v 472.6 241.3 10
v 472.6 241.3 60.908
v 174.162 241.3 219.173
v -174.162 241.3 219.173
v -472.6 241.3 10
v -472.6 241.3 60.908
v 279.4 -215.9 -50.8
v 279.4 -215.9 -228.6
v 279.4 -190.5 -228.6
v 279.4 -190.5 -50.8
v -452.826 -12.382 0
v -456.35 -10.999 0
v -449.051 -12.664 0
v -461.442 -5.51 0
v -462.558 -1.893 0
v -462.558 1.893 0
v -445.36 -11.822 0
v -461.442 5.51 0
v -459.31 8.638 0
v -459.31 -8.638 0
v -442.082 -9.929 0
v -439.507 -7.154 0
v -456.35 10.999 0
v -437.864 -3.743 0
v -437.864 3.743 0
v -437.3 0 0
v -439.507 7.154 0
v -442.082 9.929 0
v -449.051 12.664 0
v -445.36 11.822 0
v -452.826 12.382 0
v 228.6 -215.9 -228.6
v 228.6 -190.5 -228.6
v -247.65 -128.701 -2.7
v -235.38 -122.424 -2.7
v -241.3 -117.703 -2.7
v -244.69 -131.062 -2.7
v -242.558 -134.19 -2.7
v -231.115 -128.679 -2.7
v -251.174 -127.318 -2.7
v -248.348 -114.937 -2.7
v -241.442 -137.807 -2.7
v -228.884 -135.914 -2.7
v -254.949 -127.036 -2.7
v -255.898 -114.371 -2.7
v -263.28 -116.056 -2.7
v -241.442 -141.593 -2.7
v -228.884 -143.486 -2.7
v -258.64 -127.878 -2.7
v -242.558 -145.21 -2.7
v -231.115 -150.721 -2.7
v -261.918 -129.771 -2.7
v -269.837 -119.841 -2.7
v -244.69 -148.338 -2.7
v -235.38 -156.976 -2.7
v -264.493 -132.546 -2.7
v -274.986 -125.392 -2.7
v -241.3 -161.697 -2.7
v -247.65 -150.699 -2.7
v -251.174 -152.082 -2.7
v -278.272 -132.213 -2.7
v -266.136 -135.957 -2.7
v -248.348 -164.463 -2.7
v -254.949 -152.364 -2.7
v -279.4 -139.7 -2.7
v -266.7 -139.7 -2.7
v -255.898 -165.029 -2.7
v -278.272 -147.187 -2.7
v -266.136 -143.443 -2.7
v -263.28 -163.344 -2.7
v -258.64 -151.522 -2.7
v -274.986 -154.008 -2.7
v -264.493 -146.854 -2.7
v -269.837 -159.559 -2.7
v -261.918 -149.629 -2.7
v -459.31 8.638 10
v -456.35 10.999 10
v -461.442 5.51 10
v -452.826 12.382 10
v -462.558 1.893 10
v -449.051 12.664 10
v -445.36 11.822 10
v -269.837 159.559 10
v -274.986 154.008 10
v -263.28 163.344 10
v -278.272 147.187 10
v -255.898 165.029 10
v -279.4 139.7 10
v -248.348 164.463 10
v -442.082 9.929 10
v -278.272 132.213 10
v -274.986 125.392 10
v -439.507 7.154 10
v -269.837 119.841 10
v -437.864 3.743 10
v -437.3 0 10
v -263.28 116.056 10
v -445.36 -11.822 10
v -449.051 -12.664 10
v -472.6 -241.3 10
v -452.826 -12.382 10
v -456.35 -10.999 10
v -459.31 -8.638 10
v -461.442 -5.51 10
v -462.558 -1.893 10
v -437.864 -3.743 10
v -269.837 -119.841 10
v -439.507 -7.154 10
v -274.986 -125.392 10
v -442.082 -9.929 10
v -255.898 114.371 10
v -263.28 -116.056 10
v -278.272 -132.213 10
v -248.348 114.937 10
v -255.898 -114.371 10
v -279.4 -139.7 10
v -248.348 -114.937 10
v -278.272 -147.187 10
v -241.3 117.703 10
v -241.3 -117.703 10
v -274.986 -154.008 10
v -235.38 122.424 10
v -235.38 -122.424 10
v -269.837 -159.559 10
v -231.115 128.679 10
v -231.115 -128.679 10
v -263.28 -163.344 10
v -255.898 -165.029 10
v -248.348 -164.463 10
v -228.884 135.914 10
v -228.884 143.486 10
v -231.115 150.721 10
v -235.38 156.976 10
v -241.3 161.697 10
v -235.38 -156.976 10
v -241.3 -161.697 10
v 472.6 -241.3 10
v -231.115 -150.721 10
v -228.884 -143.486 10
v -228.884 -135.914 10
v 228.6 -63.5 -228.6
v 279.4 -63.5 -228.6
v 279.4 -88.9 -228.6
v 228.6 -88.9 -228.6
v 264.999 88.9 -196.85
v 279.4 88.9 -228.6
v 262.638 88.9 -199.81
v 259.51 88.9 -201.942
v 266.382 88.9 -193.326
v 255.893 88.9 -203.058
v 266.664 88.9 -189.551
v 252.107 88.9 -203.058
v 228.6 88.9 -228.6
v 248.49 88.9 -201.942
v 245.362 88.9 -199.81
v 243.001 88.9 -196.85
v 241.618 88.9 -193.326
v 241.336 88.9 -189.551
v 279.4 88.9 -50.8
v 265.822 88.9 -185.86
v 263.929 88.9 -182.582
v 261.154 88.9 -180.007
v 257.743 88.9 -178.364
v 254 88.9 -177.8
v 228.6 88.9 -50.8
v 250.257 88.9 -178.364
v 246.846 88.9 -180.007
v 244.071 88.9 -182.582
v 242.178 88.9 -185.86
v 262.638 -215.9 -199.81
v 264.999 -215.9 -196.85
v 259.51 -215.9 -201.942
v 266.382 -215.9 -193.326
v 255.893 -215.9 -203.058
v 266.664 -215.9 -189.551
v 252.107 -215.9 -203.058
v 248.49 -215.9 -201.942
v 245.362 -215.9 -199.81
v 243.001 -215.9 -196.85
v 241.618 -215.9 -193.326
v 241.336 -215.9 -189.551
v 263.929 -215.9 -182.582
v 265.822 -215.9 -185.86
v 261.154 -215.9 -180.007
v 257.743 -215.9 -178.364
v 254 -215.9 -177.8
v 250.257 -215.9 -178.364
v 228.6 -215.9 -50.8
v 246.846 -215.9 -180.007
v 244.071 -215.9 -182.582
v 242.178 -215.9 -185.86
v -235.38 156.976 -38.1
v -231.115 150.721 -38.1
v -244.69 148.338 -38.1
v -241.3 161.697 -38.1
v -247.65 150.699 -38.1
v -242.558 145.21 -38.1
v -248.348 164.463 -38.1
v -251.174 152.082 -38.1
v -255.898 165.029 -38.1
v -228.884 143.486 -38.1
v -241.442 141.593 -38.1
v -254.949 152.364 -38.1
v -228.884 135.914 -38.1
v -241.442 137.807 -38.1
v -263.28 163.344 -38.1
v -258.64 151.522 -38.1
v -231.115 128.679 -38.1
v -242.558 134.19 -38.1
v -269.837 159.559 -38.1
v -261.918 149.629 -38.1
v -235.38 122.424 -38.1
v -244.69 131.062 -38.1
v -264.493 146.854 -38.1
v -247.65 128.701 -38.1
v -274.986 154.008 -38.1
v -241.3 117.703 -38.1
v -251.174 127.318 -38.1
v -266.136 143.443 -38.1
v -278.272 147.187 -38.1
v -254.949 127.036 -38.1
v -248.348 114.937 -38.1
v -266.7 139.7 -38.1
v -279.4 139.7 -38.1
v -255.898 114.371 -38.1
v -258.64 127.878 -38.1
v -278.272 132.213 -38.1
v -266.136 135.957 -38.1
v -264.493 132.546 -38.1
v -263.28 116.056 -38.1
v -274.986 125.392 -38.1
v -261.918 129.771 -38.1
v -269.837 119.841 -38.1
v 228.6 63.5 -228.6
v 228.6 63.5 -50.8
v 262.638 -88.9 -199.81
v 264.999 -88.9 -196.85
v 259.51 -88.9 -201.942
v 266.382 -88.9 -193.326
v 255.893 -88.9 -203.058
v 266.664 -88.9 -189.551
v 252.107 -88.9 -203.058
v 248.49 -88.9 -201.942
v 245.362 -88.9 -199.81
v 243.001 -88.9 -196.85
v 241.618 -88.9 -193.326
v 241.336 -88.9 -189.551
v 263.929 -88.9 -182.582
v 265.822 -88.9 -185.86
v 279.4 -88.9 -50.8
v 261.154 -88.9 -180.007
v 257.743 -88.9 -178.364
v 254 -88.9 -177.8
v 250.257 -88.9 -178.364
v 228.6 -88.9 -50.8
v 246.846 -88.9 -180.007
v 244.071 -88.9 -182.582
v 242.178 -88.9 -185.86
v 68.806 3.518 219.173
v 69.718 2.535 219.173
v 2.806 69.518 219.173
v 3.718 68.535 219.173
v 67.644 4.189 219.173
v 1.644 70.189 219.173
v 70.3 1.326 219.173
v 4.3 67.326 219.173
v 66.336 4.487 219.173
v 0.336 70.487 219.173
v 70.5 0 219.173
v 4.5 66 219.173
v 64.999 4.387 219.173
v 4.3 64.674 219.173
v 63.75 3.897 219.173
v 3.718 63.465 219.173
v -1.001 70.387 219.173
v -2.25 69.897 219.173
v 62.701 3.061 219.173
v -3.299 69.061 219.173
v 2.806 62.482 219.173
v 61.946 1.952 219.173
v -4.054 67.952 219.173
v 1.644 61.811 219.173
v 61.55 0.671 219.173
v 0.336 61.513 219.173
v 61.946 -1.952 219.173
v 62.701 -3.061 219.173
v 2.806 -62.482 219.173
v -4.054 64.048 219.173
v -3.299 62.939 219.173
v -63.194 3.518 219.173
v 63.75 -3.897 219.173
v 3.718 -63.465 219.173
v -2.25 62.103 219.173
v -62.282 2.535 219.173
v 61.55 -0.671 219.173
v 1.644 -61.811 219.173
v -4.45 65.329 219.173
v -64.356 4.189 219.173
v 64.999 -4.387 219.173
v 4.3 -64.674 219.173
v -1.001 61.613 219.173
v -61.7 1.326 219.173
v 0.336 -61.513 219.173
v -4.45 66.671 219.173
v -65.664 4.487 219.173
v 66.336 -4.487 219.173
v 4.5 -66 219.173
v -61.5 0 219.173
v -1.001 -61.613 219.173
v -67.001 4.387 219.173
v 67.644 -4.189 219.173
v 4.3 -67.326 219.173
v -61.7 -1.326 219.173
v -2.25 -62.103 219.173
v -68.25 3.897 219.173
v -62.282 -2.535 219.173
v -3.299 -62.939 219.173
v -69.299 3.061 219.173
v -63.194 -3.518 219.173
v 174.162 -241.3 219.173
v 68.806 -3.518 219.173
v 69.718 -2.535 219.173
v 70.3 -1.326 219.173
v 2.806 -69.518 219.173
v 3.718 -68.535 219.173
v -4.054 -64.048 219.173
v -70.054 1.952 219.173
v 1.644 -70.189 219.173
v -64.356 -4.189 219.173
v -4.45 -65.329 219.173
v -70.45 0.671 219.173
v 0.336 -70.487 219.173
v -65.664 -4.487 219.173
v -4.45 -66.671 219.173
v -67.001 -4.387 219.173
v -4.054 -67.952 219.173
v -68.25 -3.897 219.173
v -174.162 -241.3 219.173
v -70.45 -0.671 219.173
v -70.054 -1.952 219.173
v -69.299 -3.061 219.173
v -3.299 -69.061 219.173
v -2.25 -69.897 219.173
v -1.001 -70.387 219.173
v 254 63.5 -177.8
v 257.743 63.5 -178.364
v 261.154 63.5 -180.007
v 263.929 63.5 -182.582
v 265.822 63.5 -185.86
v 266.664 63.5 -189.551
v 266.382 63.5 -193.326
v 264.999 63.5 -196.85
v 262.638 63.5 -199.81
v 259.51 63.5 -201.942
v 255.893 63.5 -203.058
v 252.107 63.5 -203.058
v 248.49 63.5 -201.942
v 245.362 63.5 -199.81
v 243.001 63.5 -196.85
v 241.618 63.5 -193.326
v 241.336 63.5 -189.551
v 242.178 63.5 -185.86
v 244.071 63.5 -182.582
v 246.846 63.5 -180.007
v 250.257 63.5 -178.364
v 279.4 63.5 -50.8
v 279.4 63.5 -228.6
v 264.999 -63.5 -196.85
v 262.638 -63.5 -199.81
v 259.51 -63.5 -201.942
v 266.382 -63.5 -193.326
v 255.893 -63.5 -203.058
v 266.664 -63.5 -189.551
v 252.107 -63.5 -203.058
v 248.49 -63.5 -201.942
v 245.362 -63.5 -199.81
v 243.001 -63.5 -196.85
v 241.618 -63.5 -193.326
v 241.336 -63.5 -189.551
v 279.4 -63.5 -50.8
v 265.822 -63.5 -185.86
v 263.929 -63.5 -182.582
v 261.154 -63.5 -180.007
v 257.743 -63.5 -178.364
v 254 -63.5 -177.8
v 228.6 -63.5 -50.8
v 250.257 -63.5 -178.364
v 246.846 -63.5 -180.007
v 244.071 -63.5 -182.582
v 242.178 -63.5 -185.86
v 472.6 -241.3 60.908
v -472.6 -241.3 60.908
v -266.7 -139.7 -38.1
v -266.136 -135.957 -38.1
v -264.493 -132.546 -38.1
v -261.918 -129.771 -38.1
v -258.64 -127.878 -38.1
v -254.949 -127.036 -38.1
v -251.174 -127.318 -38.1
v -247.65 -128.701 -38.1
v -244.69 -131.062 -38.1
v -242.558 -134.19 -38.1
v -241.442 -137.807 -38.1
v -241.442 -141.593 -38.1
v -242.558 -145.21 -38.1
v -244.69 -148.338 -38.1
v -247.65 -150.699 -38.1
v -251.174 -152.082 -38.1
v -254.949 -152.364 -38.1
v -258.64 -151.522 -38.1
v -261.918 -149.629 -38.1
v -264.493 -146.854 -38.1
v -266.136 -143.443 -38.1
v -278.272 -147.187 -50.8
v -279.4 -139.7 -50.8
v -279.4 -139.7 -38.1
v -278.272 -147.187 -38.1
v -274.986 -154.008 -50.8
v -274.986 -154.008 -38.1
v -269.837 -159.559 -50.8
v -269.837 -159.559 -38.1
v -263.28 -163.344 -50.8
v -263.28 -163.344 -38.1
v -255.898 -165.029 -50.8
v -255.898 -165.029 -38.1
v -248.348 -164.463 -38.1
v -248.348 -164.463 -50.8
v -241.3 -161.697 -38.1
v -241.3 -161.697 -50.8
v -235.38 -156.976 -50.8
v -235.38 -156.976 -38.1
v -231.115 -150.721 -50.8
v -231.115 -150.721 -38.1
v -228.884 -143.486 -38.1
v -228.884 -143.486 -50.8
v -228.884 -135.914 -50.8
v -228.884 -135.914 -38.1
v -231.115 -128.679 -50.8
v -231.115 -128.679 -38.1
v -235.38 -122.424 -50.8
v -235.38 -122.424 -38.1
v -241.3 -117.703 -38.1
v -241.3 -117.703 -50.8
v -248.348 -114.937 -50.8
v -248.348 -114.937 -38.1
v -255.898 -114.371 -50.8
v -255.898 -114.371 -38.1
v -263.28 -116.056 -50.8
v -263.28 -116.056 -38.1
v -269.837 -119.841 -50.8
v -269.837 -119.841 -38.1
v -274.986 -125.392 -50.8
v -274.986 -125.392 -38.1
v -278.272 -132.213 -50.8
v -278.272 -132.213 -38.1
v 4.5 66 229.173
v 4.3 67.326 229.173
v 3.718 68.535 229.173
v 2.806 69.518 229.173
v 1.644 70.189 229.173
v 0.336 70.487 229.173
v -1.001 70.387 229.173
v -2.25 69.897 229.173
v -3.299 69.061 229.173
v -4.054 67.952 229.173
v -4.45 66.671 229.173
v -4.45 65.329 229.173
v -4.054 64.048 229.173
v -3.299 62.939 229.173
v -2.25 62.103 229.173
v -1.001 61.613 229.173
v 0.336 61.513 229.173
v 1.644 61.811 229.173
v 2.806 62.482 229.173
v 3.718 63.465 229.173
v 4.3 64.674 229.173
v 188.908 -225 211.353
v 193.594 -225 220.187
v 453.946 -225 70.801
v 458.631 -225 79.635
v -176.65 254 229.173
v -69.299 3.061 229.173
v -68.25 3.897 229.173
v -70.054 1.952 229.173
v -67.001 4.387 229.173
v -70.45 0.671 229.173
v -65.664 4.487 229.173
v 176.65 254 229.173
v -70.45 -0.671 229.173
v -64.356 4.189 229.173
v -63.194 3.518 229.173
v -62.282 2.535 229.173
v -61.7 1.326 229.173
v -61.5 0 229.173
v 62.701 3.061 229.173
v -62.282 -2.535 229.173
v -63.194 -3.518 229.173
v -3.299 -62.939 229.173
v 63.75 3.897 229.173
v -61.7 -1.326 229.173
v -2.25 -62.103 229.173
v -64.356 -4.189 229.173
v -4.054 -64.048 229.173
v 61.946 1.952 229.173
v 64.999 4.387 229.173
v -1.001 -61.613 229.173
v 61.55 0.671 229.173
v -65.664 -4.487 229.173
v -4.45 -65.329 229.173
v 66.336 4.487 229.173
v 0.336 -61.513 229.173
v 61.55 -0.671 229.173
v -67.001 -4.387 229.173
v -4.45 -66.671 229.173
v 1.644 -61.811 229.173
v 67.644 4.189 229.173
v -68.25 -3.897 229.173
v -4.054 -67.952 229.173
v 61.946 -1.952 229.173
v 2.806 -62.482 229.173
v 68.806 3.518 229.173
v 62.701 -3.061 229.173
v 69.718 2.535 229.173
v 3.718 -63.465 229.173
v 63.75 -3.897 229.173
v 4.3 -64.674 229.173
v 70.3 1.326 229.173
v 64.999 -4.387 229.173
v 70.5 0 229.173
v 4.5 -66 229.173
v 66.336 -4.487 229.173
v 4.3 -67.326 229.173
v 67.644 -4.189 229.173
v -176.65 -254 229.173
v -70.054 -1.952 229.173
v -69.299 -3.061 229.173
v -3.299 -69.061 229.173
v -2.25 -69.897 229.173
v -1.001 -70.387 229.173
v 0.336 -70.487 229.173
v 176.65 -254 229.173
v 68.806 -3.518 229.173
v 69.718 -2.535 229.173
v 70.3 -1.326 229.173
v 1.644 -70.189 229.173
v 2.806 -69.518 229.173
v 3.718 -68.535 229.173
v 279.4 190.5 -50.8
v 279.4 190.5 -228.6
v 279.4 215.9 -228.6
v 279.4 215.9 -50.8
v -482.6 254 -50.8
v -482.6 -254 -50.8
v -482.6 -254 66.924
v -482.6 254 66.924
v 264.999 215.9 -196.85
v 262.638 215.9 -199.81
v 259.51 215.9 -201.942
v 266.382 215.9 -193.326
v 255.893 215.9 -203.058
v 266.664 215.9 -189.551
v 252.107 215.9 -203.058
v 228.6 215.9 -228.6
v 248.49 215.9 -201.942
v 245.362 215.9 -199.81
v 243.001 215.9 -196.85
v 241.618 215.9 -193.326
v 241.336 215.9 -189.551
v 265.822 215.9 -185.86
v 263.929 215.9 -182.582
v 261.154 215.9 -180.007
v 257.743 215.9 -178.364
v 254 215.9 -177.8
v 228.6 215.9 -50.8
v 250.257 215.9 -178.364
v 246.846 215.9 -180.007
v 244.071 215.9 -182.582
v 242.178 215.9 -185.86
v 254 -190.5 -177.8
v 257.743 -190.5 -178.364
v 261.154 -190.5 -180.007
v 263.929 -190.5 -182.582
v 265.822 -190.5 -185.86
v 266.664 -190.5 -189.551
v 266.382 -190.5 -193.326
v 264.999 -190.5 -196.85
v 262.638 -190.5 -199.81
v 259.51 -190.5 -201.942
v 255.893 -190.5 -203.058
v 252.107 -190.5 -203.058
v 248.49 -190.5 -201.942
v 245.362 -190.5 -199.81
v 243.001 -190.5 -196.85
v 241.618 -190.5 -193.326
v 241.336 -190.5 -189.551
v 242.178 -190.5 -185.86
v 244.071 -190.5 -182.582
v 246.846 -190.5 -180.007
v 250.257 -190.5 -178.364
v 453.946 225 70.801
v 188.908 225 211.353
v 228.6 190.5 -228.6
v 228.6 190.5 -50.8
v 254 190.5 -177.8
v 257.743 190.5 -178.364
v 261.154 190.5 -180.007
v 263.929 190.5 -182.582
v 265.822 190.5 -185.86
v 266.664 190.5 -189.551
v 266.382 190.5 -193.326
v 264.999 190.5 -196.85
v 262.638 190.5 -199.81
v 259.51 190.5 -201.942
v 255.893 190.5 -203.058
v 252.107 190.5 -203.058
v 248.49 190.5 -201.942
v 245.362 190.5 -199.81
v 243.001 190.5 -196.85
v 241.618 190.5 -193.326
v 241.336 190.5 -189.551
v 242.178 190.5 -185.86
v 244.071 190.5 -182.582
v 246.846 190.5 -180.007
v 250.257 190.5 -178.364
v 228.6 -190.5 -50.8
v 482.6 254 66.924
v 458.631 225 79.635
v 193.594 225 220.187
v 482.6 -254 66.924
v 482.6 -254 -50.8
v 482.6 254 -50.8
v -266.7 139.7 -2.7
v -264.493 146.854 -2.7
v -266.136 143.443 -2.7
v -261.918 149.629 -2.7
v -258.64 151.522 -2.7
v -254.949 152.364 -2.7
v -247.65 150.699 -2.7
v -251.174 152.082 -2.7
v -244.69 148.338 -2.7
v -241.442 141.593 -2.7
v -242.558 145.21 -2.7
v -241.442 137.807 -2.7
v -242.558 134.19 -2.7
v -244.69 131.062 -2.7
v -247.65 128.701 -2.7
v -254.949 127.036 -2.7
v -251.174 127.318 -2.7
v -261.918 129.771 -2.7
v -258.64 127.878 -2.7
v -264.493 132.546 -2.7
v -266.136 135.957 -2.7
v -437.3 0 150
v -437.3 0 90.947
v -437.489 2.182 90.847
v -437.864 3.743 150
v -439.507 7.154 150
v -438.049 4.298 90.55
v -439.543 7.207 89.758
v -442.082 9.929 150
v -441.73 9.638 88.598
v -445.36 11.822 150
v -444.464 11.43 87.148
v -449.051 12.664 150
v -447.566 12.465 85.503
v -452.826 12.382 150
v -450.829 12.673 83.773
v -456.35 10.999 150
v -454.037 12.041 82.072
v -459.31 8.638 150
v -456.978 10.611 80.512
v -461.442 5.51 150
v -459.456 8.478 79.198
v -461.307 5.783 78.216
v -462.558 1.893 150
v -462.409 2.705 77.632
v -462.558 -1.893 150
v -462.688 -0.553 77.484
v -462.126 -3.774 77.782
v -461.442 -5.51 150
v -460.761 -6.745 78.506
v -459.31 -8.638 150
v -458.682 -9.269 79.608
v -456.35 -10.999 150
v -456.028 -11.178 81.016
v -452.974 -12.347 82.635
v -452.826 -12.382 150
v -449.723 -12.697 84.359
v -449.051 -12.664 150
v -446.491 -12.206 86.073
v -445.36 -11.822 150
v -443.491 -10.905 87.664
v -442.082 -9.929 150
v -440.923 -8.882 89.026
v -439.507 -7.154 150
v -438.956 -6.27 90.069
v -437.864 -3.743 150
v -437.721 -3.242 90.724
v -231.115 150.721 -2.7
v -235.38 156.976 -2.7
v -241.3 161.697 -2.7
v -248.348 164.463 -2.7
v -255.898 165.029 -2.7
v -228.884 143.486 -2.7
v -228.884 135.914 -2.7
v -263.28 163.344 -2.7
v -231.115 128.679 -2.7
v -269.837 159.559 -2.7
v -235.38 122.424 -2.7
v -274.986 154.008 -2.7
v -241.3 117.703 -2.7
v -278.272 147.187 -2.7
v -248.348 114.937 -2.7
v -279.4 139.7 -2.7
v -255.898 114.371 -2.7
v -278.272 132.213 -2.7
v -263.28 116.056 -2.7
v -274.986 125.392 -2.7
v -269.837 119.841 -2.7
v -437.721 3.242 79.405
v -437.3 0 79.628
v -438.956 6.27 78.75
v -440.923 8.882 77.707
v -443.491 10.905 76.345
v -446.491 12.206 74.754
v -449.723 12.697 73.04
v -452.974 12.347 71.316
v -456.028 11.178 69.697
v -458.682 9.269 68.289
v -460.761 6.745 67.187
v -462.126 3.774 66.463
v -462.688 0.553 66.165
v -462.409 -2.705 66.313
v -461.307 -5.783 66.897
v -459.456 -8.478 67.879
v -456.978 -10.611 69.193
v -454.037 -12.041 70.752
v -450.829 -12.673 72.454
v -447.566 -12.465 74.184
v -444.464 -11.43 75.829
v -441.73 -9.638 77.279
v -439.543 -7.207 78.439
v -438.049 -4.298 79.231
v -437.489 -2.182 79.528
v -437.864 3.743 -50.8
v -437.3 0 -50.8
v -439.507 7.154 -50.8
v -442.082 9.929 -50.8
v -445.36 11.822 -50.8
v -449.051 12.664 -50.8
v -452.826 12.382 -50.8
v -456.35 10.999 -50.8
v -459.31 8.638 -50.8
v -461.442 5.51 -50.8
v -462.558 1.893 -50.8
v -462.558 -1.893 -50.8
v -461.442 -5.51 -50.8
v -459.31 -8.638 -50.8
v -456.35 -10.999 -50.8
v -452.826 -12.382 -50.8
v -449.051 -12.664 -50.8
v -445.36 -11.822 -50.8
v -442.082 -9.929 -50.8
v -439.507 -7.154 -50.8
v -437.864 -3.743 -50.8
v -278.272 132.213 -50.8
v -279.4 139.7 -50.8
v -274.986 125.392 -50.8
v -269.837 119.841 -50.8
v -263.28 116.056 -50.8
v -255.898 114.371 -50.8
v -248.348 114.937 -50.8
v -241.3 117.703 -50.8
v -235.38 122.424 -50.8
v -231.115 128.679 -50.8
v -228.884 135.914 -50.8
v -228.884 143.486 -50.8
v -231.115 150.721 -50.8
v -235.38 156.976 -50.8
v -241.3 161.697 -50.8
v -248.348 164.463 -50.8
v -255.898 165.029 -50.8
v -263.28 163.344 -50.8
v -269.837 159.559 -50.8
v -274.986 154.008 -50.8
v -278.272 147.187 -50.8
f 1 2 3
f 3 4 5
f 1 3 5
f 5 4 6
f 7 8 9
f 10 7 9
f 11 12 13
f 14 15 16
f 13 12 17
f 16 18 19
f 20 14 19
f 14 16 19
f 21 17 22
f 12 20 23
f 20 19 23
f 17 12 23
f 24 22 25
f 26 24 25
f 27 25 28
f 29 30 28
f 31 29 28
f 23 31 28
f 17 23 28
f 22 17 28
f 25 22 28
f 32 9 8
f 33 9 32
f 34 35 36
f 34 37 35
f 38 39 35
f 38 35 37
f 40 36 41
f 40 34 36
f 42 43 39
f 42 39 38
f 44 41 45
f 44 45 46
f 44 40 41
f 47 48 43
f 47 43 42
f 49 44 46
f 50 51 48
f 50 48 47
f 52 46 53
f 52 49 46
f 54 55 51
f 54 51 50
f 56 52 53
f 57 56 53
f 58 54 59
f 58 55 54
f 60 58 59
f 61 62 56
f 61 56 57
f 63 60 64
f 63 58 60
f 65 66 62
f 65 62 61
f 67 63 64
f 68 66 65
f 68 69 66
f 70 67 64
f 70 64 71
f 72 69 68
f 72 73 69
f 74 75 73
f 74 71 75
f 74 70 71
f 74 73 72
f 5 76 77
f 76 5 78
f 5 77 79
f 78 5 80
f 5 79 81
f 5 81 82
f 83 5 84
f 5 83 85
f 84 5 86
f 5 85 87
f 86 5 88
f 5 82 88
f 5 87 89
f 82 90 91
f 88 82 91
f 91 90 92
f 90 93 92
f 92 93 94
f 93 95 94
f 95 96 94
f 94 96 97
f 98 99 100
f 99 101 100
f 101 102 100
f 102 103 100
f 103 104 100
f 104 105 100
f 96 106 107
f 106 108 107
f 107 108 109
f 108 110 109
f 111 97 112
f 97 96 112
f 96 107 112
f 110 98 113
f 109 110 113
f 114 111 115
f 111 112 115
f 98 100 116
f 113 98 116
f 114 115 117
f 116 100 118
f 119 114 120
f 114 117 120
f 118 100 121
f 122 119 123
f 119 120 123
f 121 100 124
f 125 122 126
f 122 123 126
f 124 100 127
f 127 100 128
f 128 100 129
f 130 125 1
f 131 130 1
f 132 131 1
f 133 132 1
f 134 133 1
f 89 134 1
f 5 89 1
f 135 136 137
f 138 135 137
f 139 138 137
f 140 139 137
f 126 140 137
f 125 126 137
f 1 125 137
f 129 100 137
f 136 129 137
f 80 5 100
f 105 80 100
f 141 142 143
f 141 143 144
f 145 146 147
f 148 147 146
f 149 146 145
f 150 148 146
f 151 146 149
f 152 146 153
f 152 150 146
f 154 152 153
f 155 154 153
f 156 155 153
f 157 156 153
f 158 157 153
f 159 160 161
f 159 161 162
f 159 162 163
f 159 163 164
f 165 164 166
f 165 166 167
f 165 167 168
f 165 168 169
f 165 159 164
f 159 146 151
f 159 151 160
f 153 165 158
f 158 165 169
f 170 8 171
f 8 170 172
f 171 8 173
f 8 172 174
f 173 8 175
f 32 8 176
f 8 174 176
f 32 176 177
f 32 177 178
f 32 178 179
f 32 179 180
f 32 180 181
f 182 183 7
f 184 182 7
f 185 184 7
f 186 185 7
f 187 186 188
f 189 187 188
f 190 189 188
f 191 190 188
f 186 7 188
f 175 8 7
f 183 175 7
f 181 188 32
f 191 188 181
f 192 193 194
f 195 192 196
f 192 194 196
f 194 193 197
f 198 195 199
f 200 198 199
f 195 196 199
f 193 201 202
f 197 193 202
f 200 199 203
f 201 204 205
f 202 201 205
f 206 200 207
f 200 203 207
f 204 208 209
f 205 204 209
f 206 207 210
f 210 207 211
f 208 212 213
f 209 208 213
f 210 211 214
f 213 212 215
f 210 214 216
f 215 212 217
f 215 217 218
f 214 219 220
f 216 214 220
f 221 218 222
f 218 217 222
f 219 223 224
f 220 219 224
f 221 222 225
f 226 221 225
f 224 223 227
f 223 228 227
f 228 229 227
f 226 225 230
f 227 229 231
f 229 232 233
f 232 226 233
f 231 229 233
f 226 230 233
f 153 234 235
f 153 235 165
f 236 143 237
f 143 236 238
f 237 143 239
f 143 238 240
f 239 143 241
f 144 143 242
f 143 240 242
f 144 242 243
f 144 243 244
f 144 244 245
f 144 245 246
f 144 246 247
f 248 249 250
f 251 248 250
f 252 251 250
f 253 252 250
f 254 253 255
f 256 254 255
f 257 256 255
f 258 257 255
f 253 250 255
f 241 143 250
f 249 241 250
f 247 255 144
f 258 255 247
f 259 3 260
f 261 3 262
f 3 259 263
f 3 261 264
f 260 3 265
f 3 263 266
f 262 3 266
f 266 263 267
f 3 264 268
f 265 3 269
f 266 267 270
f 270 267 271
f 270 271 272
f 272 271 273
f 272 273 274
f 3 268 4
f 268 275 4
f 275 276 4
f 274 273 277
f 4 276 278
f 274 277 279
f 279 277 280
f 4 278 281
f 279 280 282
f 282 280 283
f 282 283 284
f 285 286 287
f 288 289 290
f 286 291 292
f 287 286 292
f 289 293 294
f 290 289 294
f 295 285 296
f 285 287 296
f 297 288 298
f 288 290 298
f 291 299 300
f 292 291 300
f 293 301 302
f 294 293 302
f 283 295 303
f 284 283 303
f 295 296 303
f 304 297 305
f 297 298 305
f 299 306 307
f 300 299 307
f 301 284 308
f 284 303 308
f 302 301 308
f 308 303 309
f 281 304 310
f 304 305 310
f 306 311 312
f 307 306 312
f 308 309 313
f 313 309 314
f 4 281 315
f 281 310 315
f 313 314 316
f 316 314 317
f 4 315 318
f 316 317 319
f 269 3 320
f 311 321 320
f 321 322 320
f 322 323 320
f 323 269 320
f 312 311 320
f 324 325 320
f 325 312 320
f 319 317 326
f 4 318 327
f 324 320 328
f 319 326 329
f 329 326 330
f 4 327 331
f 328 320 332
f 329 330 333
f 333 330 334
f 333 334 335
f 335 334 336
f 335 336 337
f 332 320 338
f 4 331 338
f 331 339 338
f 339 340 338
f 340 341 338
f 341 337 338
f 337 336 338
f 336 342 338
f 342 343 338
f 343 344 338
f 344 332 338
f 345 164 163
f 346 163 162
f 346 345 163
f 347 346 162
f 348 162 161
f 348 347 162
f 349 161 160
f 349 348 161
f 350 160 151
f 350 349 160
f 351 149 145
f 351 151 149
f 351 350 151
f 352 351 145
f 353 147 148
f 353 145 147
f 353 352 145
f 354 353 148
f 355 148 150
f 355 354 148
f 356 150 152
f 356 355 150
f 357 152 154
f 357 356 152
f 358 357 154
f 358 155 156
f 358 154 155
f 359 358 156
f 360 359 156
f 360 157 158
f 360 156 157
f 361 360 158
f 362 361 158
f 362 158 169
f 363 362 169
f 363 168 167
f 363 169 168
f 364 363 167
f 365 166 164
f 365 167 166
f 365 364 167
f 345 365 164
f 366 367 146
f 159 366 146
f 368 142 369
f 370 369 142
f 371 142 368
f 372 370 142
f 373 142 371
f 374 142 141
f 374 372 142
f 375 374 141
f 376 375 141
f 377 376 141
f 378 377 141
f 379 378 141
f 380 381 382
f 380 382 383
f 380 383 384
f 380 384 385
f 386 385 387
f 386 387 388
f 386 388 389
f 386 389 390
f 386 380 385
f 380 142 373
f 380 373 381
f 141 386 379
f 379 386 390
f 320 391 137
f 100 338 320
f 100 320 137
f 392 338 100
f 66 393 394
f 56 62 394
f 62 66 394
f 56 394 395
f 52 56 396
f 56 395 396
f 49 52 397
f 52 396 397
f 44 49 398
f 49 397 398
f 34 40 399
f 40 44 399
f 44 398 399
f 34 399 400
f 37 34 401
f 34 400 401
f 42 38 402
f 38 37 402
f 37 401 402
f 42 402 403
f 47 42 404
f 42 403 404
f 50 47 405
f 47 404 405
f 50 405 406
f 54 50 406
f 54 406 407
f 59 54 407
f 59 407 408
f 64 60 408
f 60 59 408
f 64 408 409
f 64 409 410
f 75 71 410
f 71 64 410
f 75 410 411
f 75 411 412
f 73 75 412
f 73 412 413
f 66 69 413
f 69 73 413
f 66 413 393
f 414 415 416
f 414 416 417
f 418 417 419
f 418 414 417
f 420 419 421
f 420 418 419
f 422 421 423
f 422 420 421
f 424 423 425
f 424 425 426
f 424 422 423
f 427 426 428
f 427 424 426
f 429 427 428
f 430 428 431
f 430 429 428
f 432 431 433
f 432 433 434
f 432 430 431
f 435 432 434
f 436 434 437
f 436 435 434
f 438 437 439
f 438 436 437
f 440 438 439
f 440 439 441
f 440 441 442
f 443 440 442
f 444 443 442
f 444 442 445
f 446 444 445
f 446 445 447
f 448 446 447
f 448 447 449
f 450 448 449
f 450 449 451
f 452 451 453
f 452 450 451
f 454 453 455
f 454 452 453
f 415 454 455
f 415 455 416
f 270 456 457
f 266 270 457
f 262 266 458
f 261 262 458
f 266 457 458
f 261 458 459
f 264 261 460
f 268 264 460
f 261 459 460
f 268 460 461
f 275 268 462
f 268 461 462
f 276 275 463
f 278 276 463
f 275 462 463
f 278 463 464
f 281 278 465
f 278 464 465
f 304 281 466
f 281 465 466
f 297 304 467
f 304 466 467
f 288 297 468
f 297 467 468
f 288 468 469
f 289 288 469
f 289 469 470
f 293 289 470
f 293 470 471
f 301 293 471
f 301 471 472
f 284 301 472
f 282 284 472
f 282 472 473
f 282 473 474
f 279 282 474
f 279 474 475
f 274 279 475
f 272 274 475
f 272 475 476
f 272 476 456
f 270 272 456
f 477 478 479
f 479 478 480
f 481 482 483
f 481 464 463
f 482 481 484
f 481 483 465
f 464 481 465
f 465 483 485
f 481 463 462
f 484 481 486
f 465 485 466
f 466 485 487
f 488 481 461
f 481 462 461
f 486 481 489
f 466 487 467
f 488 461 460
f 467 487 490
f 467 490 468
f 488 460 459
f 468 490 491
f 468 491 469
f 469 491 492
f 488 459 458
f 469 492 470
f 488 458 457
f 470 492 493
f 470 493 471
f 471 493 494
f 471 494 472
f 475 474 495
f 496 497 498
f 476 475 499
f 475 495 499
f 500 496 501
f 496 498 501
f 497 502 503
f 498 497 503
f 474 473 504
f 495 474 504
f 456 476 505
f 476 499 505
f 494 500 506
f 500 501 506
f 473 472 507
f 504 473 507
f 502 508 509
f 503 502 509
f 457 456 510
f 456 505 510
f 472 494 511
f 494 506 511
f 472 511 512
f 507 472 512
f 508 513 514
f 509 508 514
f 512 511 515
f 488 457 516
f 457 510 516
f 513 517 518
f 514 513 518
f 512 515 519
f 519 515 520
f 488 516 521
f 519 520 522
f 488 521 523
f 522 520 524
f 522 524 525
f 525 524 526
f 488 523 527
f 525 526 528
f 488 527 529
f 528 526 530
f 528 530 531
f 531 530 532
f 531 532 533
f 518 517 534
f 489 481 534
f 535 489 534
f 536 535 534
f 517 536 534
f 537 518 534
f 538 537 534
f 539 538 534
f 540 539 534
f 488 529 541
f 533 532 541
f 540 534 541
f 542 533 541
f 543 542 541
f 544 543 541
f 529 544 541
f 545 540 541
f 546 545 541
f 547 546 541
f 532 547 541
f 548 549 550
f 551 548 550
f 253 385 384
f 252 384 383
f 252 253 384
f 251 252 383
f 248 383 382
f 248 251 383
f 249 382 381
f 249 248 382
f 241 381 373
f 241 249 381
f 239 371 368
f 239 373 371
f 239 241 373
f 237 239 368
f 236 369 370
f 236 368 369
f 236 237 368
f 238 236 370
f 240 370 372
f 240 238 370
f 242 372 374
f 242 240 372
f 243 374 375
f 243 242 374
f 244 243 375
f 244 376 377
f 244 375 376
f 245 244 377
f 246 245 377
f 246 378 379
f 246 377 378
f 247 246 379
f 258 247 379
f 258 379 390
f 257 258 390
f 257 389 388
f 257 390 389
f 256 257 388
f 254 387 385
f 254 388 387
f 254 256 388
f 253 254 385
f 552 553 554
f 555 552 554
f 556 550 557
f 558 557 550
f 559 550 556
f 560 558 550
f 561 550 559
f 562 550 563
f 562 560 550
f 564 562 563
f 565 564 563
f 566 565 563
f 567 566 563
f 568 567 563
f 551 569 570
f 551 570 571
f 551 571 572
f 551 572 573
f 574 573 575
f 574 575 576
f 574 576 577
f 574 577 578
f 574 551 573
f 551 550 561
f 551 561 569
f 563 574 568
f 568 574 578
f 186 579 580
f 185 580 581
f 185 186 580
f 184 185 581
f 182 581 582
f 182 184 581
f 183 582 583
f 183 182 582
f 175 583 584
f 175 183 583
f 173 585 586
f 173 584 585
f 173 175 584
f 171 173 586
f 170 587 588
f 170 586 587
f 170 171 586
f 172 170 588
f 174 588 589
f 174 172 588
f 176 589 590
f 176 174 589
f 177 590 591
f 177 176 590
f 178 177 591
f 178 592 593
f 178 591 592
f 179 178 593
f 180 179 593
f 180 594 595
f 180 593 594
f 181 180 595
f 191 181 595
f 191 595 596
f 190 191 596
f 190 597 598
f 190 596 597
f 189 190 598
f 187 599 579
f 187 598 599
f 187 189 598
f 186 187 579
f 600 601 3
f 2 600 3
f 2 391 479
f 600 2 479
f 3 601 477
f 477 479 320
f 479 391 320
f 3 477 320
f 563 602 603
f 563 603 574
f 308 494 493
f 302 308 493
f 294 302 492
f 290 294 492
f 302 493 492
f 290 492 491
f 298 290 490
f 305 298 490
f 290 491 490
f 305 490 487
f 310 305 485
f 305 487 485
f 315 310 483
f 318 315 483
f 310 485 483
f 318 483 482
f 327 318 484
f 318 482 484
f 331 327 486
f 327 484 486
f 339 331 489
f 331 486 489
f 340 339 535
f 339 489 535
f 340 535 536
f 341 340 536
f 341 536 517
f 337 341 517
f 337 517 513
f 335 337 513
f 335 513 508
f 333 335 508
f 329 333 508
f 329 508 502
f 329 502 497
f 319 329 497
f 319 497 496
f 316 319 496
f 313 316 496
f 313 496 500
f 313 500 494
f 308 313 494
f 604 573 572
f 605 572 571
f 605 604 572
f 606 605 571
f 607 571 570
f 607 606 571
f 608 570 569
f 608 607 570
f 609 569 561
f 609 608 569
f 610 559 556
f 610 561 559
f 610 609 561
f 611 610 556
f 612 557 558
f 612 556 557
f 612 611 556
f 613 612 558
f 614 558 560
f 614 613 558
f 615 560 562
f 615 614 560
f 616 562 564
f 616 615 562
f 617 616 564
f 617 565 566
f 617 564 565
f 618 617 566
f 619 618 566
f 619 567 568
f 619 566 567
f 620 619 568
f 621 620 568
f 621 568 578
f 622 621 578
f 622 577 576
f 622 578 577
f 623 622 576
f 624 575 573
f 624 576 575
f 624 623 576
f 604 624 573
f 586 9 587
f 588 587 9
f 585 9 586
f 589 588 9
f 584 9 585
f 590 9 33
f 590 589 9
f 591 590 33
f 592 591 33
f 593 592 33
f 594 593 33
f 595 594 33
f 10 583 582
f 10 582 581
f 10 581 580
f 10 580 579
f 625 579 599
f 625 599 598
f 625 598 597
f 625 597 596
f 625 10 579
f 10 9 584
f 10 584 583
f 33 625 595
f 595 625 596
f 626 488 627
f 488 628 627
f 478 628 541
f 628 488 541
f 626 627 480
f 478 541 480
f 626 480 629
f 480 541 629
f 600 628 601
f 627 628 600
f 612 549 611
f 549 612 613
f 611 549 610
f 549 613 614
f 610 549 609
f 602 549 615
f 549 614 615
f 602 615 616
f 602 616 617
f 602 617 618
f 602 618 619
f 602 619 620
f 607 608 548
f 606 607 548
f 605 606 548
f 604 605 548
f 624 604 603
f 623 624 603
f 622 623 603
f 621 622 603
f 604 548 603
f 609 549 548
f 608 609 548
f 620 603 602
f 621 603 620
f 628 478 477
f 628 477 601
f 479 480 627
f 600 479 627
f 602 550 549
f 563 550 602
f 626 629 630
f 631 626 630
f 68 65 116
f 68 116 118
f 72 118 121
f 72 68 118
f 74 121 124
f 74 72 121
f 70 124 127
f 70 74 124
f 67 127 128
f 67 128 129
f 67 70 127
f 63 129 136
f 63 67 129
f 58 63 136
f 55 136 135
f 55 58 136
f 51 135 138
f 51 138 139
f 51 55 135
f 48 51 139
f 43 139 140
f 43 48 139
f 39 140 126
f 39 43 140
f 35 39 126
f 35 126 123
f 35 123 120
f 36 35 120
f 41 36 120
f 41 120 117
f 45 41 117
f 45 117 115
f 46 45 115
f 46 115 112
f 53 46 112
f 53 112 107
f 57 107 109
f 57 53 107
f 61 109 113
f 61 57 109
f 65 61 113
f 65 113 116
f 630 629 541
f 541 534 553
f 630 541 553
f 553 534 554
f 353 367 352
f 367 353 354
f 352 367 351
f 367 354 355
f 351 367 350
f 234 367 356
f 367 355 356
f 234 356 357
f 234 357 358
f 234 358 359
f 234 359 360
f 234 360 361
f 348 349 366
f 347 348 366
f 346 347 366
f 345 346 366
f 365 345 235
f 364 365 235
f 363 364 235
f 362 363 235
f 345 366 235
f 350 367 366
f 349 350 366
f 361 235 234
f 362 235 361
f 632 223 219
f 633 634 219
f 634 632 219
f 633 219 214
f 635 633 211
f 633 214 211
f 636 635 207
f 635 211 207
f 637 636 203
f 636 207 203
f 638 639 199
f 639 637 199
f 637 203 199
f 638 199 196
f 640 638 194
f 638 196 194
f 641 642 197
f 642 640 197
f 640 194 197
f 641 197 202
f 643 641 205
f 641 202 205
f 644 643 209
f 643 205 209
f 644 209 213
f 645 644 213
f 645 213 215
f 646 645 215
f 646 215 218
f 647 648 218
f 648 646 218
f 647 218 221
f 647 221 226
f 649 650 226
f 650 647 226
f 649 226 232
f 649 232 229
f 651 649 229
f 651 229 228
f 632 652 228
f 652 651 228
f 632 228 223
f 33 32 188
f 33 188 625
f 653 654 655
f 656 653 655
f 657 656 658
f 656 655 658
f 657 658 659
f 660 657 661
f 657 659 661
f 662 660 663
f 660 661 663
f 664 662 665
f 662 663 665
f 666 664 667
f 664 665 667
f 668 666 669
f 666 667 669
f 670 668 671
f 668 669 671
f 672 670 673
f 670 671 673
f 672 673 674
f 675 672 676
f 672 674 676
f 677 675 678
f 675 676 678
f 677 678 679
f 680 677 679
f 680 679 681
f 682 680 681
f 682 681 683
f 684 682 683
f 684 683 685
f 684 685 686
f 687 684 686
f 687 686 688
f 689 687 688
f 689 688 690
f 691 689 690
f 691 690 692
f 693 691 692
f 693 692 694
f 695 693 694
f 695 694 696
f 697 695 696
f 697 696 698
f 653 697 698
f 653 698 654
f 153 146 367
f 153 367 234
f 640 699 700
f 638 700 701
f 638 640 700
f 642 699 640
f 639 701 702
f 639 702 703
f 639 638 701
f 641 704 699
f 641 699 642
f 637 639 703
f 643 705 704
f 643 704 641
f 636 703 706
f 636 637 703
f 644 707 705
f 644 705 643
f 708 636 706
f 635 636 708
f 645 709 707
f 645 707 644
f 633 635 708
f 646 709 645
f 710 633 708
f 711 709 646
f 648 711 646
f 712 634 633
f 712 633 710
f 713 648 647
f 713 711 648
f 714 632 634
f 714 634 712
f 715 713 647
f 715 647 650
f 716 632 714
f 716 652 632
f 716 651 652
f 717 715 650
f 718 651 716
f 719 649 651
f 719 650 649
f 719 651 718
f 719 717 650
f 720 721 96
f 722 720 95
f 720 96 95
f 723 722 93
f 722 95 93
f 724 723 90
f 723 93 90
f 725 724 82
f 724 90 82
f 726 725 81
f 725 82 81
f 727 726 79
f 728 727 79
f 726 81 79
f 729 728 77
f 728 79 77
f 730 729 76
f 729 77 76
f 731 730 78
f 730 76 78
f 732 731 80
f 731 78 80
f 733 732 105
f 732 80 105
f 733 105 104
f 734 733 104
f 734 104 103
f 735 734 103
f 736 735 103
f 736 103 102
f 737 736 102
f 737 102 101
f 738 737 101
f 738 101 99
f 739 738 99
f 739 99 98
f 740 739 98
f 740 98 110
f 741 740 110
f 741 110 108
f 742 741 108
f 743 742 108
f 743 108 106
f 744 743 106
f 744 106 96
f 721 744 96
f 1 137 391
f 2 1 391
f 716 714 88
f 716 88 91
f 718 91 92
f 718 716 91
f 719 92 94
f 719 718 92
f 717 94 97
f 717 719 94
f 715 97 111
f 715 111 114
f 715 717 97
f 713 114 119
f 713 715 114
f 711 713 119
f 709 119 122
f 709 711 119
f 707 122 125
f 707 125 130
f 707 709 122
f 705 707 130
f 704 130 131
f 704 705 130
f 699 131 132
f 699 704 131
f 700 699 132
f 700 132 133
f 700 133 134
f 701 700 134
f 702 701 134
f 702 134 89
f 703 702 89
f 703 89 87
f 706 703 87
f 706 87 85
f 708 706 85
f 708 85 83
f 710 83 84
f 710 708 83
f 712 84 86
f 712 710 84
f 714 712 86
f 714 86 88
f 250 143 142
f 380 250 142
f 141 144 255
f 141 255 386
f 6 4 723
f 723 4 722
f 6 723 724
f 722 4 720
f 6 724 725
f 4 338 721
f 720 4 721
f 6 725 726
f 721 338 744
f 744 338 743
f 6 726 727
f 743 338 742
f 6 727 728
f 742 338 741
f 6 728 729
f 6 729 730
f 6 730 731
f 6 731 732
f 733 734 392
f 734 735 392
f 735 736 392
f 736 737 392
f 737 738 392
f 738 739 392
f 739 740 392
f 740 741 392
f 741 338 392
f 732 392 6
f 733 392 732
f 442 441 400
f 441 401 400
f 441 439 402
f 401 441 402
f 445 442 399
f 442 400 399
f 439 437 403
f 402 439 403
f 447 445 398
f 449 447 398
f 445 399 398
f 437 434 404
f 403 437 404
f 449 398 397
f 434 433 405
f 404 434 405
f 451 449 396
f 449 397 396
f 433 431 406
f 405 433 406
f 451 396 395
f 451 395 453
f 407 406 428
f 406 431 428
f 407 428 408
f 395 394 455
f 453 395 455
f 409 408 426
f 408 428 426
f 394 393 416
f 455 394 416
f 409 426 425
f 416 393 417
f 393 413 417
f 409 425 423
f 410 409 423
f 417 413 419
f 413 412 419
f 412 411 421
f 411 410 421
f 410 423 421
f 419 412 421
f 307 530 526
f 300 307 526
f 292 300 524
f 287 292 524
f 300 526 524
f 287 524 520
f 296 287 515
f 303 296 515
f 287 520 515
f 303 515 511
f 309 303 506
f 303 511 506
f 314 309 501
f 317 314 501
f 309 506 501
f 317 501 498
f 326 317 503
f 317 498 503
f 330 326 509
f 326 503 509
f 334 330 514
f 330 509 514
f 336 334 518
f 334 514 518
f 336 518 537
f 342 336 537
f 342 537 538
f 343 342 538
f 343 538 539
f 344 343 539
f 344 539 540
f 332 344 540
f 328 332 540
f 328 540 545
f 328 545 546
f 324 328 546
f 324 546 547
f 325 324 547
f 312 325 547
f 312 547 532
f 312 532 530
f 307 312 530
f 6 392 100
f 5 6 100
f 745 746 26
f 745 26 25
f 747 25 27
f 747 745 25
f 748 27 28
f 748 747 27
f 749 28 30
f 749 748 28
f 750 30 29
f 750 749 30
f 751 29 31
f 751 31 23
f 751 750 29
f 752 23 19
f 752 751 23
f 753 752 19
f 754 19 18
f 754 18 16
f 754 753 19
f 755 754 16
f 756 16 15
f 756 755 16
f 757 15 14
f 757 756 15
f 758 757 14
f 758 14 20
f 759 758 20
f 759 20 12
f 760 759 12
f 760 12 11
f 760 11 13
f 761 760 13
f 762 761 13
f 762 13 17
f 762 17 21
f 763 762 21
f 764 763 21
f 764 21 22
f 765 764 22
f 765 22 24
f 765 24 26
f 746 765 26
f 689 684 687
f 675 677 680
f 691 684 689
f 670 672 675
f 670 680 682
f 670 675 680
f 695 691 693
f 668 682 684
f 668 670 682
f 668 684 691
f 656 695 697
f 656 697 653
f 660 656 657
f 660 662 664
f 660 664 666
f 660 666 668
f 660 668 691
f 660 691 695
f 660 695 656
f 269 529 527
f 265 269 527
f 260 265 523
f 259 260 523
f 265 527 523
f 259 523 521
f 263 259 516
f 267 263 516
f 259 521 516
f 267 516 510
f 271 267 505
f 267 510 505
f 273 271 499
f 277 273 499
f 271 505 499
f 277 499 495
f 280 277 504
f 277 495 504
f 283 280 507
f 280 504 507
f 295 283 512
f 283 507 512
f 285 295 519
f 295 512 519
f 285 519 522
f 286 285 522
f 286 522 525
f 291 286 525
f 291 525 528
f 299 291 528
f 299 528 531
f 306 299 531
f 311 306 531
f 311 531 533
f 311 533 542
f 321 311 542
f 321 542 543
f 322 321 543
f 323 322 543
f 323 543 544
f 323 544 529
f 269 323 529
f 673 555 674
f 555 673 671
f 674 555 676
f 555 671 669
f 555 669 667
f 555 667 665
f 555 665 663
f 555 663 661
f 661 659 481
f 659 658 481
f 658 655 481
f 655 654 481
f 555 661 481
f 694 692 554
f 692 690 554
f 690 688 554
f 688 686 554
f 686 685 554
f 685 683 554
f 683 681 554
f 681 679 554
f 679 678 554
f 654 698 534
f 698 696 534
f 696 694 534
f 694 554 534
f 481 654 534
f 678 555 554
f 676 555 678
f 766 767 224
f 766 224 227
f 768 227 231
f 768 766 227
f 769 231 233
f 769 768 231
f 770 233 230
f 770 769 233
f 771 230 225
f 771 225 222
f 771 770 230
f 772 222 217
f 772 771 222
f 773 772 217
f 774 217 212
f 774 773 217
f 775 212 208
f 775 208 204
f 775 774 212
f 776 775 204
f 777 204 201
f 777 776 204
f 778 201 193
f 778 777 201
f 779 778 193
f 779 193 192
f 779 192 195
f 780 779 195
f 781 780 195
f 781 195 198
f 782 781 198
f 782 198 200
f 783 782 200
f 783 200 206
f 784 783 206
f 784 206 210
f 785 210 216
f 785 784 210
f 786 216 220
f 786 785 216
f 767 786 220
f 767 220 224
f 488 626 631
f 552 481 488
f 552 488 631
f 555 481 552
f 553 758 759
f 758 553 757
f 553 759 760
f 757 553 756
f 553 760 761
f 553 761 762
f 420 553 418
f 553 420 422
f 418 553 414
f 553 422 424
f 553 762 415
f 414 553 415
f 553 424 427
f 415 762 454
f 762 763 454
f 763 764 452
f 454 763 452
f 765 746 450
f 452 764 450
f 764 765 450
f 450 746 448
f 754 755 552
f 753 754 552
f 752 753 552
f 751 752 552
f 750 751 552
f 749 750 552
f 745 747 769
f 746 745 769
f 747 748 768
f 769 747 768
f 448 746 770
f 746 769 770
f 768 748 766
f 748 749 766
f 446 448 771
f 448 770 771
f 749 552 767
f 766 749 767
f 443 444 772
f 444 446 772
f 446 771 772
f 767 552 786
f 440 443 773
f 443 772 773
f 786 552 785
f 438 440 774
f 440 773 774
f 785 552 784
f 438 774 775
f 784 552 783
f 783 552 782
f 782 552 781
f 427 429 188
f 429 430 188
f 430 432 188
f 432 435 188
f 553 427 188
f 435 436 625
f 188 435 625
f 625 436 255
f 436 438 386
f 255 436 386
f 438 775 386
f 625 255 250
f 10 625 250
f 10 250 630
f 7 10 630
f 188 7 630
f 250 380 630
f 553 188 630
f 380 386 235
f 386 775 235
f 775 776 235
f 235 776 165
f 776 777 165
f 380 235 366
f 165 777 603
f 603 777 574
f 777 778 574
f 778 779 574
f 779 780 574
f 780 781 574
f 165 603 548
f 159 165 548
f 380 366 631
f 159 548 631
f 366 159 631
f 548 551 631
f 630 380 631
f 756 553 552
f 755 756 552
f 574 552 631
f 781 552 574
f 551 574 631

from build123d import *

# Parameters (mm, degrees)
SKETCH1_W                = 965.2
SKETCH1_H                = 508
BOSS_EXTRUDE1_DEPTH      = 50.8
SKETCH3_W                = 50.8
SKETCH3_H                = 25.4
BOSS_EXTRUDE2_DEPTH      = 177.8
CUT_EXTRUDE2_DEPTH       = 592.334693723
CUT_EXTRUDE2_DEPTH_BACK  = 592.334693723
SKETCH4_R                = 12.7
BOSS_EXTRUDE3_DEPTH      = 254
BOSS_EXTRUDE3_DEPTH_BACK = 254
BOSS_EXTRUDE4_DEPTH      = 12.7
BOSS_EXTRUDE5_START      = -508
BOSS_EXTRUDE5_DEPTH      = 12.7
CUT_EXTRUDE3_DEPTH       = 592.556393084
CUT_EXTRUDE3_DEPTH_BACK  = 592.556393084
SKETCH2_R                = 12.7
CUT_EXTRUDE4_START       = -50.8
SKETCH12_R               = 25.4
SKETCH12_R_2             = 12.7
CUT_EXTRUDE4_DEPTH       = 12.7
SKETCH13_R               = 12.7
CUT_EXTRUDE5_DEPTH       = 25.4
CUT_EXTRUDE6_START       = -2.7
SKETCH14_R               = 25.4
SKETCH14_R_2             = 12.7
CUT_EXTRUDE6_DEPTH       = 12.7
CUT_EXTRUDE7_DEPTH       = 10
CUT_EXTRUDE7_DEPTH_BACK  = 592.556393084
SKETCH15_R               = 12.7
SKETCH2_4_R              = 12.7
BOSS_EXTRUDE6_DEPTH      = 150
CUT_EXTRUDE8_REACH       = 714.022
SKETCH16_R               = 4.5
CUT_EXTRUDE9_REACH       = 823.718
SKETCH17_W               = 300
SKETCH17_H               = 450


with BuildPart() as part:
    # Sketch1 → Boss-Extrude1 (new body)
    with BuildSketch(Plane.XY):
        Rectangle(SKETCH1_W, SKETCH1_H)
    extrude(amount=-BOSS_EXTRUDE1_DEPTH)

    # Sketch3 → Boss-Extrude2 (add)
    with BuildSketch(Plane(origin=(0, 0, -50.8), x_dir=(-1, 0, 0), z_dir=(0, 0, -1))):
        with Locations((-254, 203.2)):
            Rectangle(SKETCH3_W, SKETCH3_H)
        with Locations((-254, 76.2)):
            Rectangle(SKETCH3_W, SKETCH3_H)
        with Locations((-254, -76.2)):
            Rectangle(SKETCH3_W, SKETCH3_H)
        with Locations((-254, -203.2)):
            Rectangle(SKETCH3_W, SKETCH3_H)
    extrude(amount=BOSS_EXTRUDE2_DEPTH)

    # Sketch4 → Cut-Extrude2 (cut, two sides: drawn at the far end of the back side and taken through both)
    with BuildSketch(Plane(origin=(0, 0, 0), x_dir=(1, 0, 0), z_dir=(0, 1, 0)).offset(-CUT_EXTRUDE2_DEPTH_BACK)):
        with Locations(Location((254, 190.5, 0), (0, 0, 270))):
            Circle(SKETCH4_R)
    extrude(amount=CUT_EXTRUDE2_DEPTH + CUT_EXTRUDE2_DEPTH_BACK, mode=Mode.SUBTRACT)

    # Sketch10 → Boss-Extrude3 (add, two sides: drawn at the far end of the back side and taken through both)
    with BuildSketch(Plane(origin=(0, 0, 0), x_dir=(1, 0, 0), z_dir=(0, 1, 0)).offset(-BOSS_EXTRUDE3_DEPTH_BACK)):
        Polygon((482.6, 0), (-482.6, 0), (-482.6, -66.924314291), (-176.649889789, -229.172874046), (0, -229.172874046), (176.649889789, -229.172874046), (482.6, -66.924314291), align=None)
        Polygon((-472.6, -60.908279697), (-472.6, -10), (472.6, -10), (472.6, -60.908279697), (174.162404273, -219.172874046), (0, -219.172874046), (-174.162404273, -219.172874046), align=None, mode=Mode.SUBTRACT)
    extrude(amount=BOSS_EXTRUDE3_DEPTH + BOSS_EXTRUDE3_DEPTH_BACK)

    # Sketch11 → Boss-Extrude4 (add)
    with BuildSketch(Plane.XZ.offset(254)):
        Polygon((-472.6, 10), (-472.6, 60.908279697), (-174.162404273, 219.172874046), (174.162404273, 219.172874046), (472.6, 60.908279697), (472.6, 10), align=None)
    extrude(amount=-BOSS_EXTRUDE4_DEPTH)

    # Sketch11<2> → Boss-Extrude5 (add)
    with BuildSketch(Plane.XZ.offset(254).offset(BOSS_EXTRUDE5_START)):
        Polygon((-472.6, 10), (-472.6, 60.908279697), (-174.162404273, 219.172874046), (174.162404273, 219.172874046), (472.6, 60.908279697), (472.6, 10), align=None)
    extrude(amount=BOSS_EXTRUDE5_DEPTH)

    # Sketch2 → Cut-Extrude3 (cut, two sides: drawn at the far end of the back side and taken through both)
    with BuildSketch(Plane.XY.offset(-CUT_EXTRUDE3_DEPTH_BACK)):
        with Locations((-450, 0)):
            Circle(SKETCH2_R)
    extrude(amount=CUT_EXTRUDE3_DEPTH + CUT_EXTRUDE3_DEPTH_BACK, mode=Mode.SUBTRACT)

    # Sketch12 → Cut-Extrude4 (cut)
    # profile 1 of 2: a face of its own
    with BuildSketch(Plane.XY.offset(CUT_EXTRUDE4_START)):
        with Locations(Location((-254, 139.7, 0), (0, 0, 180))):
            Circle(SKETCH12_R)
        with Locations(Location((-254, 139.7, 0), (0, 0, 180))):
            Circle(SKETCH12_R_2, mode=Mode.SUBTRACT)
    # profile 2 of 2: a face of its own
    with BuildSketch(Plane.XY.offset(CUT_EXTRUDE4_START)):
        with Locations(Location((-254, -139.7, 0), (0, 0, 180))):
            Circle(SKETCH12_R)
        with Locations(Location((-254, -139.7, 0), (0, 0, 180))):
            Circle(SKETCH12_R_2, mode=Mode.SUBTRACT)
    extrude(amount=CUT_EXTRUDE4_DEPTH, mode=Mode.SUBTRACT)

    # Sketch13 → Cut-Extrude5 (cut)
    with BuildSketch(Plane(origin=(0, 0, -50.8), x_dir=(-1, 0, 0), z_dir=(0, 0, -1))):
        with Locations((254, 139.7)):
            Circle(SKETCH13_R)
        with Locations((254, -139.7)):
            Circle(SKETCH13_R)
    extrude(amount=-CUT_EXTRUDE5_DEPTH, mode=Mode.SUBTRACT)

    # Sketch14 → Cut-Extrude6 (cut)
    # profile 1 of 2: a face of its own
    with BuildSketch(Plane.XY.offset(CUT_EXTRUDE6_START)):
        with Locations(Location((-254, 139.7, 0), (0, 0, 180))):
            Circle(SKETCH14_R)
        with Locations(Location((-254, 139.7, 0), (0, 0, 180))):
            Circle(SKETCH14_R_2, mode=Mode.SUBTRACT)
    # profile 2 of 2: a face of its own
    with BuildSketch(Plane.XY.offset(CUT_EXTRUDE6_START)):
        with Locations(Location((-254, -139.7, 0), (0, 0, 180))):
            Circle(SKETCH14_R)
        with Locations(Location((-254, -139.7, 0), (0, 0, 180))):
            Circle(SKETCH14_R_2, mode=Mode.SUBTRACT)
    extrude(amount=CUT_EXTRUDE6_DEPTH, mode=Mode.SUBTRACT)

    # Sketch15 → Cut-Extrude7 (cut, two sides: drawn at the far end of the back side and taken through both)
    with BuildSketch(Plane.XY.offset(-CUT_EXTRUDE7_DEPTH_BACK)):
        with Locations(Location((-254, -139.7, 0), (0, 0, 180))):
            Circle(SKETCH15_R)
        with Locations(Location((-254, 139.7, 0), (0, 0, 180))):
            Circle(SKETCH15_R)
    extrude(amount=CUT_EXTRUDE7_DEPTH + CUT_EXTRUDE7_DEPTH_BACK, mode=Mode.SUBTRACT)

    # Sketch2<4> → Boss-Extrude6 (add)
    with BuildSketch(Plane.XY):
        with Locations((-450, 0)):
            Circle(SKETCH2_4_R)
    extrude(amount=BOSS_EXTRUDE6_DEPTH)

    # Sketch16 → Cut-Extrude8 (cut, up to next)
    with BuildSketch(Plane.XY.offset(229.172874046), mode=Mode.PRIVATE) as cut_extrude8_sk1:
        with Locations((-66, 0)):
            Circle(SKETCH16_R)
    cut_extrude8_tool1 = extrude(cut_extrude8_sk1.sketch, amount=-CUT_EXTRUDE8_REACH, mode=Mode.PRIVATE) & part.part
    # Sketch16 → Cut-Extrude8 (cut, up to next)
    with BuildSketch(Plane.XY.offset(229.172874046), mode=Mode.PRIVATE) as cut_extrude8_sk2:
        with Locations((0, 66)):
            Circle(SKETCH16_R)
    cut_extrude8_tool2 = extrude(cut_extrude8_sk2.sketch, amount=-CUT_EXTRUDE8_REACH, mode=Mode.PRIVATE) & part.part
    # Sketch16 → Cut-Extrude8 (cut, up to next)
    with BuildSketch(Plane.XY.offset(229.172874046), mode=Mode.PRIVATE) as cut_extrude8_sk3:
        with Locations((66, 0)):
            Circle(SKETCH16_R)
    cut_extrude8_tool3 = extrude(cut_extrude8_sk3.sketch, amount=-CUT_EXTRUDE8_REACH, mode=Mode.PRIVATE) & part.part
    # Sketch16 → Cut-Extrude8 (cut, up to next)
    with BuildSketch(Plane.XY.offset(229.172874046), mode=Mode.PRIVATE) as cut_extrude8_sk4:
        with Locations((0, -66)):
            Circle(SKETCH16_R)
    cut_extrude8_tool4 = extrude(cut_extrude8_sk4.sketch, amount=-CUT_EXTRUDE8_REACH, mode=Mode.PRIVATE) & part.part
    add(cut_extrude8_tool1.solids().sort_by_distance((-66, 0, 229.172874))[0], mode=Mode.SUBTRACT)
    add(cut_extrude8_tool2.solids().sort_by_distance((0, 66, 229.172874))[0], mode=Mode.SUBTRACT)
    add(cut_extrude8_tool3.solids().sort_by_distance((66, 0, 229.172874))[0], mode=Mode.SUBTRACT)
    add(cut_extrude8_tool4.solids().sort_by_distance((0, -66, 229.172874))[0], mode=Mode.SUBTRACT)

    # Sketch17 → Cut-Extrude9 (cut, up to next)
    with BuildSketch(Plane(origin=(133.630964067, 0, 251.986262594), x_dir=(0.8834593660439969, 0, -0.4685077892086097), z_dir=(0.4685077892086097, 0, 0.8834593660439969)), mode=Mode.PRIVATE) as cut_extrude9_sk1:
        with Locations((217.872449791, 0)):
            Rectangle(SKETCH17_W, SKETCH17_H)
    cut_extrude9_tool1 = extrude(cut_extrude9_sk1.sketch, amount=-CUT_EXTRUDE9_REACH, mode=Mode.PRIVATE) & part.part
    add(cut_extrude9_tool1.solids().sort_by_distance((326.11242, 0, 149.911323))[0], mode=Mode.SUBTRACT)


solid = part.part
